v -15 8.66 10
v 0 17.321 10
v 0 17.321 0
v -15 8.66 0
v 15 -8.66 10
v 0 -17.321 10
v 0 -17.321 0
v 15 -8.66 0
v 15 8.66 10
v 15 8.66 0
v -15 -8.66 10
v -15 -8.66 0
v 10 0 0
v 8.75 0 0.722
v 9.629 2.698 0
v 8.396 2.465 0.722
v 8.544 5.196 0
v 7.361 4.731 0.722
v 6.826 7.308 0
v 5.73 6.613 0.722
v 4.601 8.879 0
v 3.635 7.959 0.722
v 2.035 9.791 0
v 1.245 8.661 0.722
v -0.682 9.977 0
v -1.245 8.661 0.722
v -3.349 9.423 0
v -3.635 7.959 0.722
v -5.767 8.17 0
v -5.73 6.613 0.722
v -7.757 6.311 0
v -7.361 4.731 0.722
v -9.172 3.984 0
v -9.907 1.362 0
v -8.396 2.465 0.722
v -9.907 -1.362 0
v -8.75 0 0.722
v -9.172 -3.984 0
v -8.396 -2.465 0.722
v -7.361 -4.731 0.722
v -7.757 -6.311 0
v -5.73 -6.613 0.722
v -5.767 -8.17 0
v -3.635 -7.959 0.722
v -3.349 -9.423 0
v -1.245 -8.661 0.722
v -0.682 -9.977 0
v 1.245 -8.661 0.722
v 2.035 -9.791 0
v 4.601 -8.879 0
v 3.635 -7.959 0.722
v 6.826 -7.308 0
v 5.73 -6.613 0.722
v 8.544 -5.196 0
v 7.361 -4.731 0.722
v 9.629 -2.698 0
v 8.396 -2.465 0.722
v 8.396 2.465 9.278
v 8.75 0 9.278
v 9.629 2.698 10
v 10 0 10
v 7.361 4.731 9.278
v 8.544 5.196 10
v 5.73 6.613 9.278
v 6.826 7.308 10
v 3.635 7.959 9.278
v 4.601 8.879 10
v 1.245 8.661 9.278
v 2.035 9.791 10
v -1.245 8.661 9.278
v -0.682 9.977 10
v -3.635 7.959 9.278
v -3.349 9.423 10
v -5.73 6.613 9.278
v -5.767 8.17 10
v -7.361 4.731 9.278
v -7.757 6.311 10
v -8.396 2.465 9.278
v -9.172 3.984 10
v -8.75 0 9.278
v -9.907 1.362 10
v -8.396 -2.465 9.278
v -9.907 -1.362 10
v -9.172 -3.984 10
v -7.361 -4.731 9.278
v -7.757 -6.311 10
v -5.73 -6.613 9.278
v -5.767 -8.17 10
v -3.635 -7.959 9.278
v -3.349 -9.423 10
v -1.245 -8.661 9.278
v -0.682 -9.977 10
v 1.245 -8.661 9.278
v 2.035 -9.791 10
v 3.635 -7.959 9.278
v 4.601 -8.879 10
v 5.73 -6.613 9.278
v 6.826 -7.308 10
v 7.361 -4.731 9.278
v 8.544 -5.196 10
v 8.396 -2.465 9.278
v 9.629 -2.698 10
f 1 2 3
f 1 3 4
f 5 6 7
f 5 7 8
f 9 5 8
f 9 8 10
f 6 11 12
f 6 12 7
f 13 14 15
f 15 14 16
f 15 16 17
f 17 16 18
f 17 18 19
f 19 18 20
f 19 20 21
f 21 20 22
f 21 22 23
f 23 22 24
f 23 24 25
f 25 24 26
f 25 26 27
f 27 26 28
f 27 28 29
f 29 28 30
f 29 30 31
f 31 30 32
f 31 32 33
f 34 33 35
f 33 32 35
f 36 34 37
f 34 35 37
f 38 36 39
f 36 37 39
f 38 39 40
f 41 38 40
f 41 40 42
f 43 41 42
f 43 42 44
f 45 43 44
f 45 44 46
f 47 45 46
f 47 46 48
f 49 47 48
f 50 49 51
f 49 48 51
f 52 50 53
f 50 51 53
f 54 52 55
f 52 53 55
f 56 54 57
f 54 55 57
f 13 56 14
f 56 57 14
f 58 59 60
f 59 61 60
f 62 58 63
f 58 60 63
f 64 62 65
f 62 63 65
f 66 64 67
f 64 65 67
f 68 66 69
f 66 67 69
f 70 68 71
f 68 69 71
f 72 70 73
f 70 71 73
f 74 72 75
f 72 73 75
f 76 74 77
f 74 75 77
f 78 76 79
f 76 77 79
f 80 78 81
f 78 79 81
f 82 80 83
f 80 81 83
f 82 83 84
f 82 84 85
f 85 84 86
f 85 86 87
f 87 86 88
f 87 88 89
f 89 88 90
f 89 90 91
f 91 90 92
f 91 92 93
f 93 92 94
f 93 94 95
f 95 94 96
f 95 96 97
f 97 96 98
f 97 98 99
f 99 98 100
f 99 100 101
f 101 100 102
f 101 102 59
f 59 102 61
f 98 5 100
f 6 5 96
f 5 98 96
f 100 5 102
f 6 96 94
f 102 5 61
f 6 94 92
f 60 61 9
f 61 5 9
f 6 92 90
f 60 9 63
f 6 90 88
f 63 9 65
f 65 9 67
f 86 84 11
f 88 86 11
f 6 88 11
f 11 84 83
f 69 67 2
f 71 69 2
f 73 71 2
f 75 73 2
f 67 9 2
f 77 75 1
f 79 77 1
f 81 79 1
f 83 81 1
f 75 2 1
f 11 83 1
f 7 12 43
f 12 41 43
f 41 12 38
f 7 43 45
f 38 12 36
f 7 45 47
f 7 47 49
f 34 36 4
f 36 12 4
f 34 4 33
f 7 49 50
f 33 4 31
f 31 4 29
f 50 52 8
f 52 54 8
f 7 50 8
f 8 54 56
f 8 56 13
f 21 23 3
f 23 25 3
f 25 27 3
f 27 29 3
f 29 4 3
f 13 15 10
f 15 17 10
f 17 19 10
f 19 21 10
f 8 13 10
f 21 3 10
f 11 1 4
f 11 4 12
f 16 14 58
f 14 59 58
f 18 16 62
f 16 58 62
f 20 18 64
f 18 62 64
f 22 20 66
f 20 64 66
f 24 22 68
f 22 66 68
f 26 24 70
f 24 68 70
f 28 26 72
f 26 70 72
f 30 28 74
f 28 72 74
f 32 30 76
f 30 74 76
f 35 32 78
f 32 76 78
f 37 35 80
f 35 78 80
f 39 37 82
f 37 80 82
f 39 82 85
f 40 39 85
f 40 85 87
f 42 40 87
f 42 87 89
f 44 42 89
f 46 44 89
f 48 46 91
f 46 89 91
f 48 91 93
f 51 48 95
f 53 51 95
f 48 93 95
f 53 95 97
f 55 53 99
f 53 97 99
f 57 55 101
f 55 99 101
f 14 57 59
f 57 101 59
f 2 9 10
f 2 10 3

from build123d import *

# Parameters (mm, degrees)
SKETCH001_R  = 18
POCKET_DEPTH = 10


with BuildPart() as part:
    # Sketch → Revolution (revolve)
    with BuildSketch(Plane.XZ):
        Polygon((10, 0), (8.75, 0.721688), (8.75, 9.278312), (10, 10), (18, 10), (18, 0), align=None)
    revolve(axis=Axis((0, 0, 0), (0, 0, 1)))

    # Sketch001 → Pocket (cut)
    with BuildSketch(Plane(origin=(0, 0, 10), x_dir=(-1, 0, 0), z_dir=(0, 0, 1))):
        Circle(SKETCH001_R)
        Polygon((-15, 8.660254), (-15, -8.660254), (0, -17.320508), (15, -8.660254), (15, 8.660254), (0, 17.320508), align=None, mode=Mode.SUBTRACT)
    extrude(amount=-POCKET_DEPTH, mode=Mode.SUBTRACT)


solid = part.part
